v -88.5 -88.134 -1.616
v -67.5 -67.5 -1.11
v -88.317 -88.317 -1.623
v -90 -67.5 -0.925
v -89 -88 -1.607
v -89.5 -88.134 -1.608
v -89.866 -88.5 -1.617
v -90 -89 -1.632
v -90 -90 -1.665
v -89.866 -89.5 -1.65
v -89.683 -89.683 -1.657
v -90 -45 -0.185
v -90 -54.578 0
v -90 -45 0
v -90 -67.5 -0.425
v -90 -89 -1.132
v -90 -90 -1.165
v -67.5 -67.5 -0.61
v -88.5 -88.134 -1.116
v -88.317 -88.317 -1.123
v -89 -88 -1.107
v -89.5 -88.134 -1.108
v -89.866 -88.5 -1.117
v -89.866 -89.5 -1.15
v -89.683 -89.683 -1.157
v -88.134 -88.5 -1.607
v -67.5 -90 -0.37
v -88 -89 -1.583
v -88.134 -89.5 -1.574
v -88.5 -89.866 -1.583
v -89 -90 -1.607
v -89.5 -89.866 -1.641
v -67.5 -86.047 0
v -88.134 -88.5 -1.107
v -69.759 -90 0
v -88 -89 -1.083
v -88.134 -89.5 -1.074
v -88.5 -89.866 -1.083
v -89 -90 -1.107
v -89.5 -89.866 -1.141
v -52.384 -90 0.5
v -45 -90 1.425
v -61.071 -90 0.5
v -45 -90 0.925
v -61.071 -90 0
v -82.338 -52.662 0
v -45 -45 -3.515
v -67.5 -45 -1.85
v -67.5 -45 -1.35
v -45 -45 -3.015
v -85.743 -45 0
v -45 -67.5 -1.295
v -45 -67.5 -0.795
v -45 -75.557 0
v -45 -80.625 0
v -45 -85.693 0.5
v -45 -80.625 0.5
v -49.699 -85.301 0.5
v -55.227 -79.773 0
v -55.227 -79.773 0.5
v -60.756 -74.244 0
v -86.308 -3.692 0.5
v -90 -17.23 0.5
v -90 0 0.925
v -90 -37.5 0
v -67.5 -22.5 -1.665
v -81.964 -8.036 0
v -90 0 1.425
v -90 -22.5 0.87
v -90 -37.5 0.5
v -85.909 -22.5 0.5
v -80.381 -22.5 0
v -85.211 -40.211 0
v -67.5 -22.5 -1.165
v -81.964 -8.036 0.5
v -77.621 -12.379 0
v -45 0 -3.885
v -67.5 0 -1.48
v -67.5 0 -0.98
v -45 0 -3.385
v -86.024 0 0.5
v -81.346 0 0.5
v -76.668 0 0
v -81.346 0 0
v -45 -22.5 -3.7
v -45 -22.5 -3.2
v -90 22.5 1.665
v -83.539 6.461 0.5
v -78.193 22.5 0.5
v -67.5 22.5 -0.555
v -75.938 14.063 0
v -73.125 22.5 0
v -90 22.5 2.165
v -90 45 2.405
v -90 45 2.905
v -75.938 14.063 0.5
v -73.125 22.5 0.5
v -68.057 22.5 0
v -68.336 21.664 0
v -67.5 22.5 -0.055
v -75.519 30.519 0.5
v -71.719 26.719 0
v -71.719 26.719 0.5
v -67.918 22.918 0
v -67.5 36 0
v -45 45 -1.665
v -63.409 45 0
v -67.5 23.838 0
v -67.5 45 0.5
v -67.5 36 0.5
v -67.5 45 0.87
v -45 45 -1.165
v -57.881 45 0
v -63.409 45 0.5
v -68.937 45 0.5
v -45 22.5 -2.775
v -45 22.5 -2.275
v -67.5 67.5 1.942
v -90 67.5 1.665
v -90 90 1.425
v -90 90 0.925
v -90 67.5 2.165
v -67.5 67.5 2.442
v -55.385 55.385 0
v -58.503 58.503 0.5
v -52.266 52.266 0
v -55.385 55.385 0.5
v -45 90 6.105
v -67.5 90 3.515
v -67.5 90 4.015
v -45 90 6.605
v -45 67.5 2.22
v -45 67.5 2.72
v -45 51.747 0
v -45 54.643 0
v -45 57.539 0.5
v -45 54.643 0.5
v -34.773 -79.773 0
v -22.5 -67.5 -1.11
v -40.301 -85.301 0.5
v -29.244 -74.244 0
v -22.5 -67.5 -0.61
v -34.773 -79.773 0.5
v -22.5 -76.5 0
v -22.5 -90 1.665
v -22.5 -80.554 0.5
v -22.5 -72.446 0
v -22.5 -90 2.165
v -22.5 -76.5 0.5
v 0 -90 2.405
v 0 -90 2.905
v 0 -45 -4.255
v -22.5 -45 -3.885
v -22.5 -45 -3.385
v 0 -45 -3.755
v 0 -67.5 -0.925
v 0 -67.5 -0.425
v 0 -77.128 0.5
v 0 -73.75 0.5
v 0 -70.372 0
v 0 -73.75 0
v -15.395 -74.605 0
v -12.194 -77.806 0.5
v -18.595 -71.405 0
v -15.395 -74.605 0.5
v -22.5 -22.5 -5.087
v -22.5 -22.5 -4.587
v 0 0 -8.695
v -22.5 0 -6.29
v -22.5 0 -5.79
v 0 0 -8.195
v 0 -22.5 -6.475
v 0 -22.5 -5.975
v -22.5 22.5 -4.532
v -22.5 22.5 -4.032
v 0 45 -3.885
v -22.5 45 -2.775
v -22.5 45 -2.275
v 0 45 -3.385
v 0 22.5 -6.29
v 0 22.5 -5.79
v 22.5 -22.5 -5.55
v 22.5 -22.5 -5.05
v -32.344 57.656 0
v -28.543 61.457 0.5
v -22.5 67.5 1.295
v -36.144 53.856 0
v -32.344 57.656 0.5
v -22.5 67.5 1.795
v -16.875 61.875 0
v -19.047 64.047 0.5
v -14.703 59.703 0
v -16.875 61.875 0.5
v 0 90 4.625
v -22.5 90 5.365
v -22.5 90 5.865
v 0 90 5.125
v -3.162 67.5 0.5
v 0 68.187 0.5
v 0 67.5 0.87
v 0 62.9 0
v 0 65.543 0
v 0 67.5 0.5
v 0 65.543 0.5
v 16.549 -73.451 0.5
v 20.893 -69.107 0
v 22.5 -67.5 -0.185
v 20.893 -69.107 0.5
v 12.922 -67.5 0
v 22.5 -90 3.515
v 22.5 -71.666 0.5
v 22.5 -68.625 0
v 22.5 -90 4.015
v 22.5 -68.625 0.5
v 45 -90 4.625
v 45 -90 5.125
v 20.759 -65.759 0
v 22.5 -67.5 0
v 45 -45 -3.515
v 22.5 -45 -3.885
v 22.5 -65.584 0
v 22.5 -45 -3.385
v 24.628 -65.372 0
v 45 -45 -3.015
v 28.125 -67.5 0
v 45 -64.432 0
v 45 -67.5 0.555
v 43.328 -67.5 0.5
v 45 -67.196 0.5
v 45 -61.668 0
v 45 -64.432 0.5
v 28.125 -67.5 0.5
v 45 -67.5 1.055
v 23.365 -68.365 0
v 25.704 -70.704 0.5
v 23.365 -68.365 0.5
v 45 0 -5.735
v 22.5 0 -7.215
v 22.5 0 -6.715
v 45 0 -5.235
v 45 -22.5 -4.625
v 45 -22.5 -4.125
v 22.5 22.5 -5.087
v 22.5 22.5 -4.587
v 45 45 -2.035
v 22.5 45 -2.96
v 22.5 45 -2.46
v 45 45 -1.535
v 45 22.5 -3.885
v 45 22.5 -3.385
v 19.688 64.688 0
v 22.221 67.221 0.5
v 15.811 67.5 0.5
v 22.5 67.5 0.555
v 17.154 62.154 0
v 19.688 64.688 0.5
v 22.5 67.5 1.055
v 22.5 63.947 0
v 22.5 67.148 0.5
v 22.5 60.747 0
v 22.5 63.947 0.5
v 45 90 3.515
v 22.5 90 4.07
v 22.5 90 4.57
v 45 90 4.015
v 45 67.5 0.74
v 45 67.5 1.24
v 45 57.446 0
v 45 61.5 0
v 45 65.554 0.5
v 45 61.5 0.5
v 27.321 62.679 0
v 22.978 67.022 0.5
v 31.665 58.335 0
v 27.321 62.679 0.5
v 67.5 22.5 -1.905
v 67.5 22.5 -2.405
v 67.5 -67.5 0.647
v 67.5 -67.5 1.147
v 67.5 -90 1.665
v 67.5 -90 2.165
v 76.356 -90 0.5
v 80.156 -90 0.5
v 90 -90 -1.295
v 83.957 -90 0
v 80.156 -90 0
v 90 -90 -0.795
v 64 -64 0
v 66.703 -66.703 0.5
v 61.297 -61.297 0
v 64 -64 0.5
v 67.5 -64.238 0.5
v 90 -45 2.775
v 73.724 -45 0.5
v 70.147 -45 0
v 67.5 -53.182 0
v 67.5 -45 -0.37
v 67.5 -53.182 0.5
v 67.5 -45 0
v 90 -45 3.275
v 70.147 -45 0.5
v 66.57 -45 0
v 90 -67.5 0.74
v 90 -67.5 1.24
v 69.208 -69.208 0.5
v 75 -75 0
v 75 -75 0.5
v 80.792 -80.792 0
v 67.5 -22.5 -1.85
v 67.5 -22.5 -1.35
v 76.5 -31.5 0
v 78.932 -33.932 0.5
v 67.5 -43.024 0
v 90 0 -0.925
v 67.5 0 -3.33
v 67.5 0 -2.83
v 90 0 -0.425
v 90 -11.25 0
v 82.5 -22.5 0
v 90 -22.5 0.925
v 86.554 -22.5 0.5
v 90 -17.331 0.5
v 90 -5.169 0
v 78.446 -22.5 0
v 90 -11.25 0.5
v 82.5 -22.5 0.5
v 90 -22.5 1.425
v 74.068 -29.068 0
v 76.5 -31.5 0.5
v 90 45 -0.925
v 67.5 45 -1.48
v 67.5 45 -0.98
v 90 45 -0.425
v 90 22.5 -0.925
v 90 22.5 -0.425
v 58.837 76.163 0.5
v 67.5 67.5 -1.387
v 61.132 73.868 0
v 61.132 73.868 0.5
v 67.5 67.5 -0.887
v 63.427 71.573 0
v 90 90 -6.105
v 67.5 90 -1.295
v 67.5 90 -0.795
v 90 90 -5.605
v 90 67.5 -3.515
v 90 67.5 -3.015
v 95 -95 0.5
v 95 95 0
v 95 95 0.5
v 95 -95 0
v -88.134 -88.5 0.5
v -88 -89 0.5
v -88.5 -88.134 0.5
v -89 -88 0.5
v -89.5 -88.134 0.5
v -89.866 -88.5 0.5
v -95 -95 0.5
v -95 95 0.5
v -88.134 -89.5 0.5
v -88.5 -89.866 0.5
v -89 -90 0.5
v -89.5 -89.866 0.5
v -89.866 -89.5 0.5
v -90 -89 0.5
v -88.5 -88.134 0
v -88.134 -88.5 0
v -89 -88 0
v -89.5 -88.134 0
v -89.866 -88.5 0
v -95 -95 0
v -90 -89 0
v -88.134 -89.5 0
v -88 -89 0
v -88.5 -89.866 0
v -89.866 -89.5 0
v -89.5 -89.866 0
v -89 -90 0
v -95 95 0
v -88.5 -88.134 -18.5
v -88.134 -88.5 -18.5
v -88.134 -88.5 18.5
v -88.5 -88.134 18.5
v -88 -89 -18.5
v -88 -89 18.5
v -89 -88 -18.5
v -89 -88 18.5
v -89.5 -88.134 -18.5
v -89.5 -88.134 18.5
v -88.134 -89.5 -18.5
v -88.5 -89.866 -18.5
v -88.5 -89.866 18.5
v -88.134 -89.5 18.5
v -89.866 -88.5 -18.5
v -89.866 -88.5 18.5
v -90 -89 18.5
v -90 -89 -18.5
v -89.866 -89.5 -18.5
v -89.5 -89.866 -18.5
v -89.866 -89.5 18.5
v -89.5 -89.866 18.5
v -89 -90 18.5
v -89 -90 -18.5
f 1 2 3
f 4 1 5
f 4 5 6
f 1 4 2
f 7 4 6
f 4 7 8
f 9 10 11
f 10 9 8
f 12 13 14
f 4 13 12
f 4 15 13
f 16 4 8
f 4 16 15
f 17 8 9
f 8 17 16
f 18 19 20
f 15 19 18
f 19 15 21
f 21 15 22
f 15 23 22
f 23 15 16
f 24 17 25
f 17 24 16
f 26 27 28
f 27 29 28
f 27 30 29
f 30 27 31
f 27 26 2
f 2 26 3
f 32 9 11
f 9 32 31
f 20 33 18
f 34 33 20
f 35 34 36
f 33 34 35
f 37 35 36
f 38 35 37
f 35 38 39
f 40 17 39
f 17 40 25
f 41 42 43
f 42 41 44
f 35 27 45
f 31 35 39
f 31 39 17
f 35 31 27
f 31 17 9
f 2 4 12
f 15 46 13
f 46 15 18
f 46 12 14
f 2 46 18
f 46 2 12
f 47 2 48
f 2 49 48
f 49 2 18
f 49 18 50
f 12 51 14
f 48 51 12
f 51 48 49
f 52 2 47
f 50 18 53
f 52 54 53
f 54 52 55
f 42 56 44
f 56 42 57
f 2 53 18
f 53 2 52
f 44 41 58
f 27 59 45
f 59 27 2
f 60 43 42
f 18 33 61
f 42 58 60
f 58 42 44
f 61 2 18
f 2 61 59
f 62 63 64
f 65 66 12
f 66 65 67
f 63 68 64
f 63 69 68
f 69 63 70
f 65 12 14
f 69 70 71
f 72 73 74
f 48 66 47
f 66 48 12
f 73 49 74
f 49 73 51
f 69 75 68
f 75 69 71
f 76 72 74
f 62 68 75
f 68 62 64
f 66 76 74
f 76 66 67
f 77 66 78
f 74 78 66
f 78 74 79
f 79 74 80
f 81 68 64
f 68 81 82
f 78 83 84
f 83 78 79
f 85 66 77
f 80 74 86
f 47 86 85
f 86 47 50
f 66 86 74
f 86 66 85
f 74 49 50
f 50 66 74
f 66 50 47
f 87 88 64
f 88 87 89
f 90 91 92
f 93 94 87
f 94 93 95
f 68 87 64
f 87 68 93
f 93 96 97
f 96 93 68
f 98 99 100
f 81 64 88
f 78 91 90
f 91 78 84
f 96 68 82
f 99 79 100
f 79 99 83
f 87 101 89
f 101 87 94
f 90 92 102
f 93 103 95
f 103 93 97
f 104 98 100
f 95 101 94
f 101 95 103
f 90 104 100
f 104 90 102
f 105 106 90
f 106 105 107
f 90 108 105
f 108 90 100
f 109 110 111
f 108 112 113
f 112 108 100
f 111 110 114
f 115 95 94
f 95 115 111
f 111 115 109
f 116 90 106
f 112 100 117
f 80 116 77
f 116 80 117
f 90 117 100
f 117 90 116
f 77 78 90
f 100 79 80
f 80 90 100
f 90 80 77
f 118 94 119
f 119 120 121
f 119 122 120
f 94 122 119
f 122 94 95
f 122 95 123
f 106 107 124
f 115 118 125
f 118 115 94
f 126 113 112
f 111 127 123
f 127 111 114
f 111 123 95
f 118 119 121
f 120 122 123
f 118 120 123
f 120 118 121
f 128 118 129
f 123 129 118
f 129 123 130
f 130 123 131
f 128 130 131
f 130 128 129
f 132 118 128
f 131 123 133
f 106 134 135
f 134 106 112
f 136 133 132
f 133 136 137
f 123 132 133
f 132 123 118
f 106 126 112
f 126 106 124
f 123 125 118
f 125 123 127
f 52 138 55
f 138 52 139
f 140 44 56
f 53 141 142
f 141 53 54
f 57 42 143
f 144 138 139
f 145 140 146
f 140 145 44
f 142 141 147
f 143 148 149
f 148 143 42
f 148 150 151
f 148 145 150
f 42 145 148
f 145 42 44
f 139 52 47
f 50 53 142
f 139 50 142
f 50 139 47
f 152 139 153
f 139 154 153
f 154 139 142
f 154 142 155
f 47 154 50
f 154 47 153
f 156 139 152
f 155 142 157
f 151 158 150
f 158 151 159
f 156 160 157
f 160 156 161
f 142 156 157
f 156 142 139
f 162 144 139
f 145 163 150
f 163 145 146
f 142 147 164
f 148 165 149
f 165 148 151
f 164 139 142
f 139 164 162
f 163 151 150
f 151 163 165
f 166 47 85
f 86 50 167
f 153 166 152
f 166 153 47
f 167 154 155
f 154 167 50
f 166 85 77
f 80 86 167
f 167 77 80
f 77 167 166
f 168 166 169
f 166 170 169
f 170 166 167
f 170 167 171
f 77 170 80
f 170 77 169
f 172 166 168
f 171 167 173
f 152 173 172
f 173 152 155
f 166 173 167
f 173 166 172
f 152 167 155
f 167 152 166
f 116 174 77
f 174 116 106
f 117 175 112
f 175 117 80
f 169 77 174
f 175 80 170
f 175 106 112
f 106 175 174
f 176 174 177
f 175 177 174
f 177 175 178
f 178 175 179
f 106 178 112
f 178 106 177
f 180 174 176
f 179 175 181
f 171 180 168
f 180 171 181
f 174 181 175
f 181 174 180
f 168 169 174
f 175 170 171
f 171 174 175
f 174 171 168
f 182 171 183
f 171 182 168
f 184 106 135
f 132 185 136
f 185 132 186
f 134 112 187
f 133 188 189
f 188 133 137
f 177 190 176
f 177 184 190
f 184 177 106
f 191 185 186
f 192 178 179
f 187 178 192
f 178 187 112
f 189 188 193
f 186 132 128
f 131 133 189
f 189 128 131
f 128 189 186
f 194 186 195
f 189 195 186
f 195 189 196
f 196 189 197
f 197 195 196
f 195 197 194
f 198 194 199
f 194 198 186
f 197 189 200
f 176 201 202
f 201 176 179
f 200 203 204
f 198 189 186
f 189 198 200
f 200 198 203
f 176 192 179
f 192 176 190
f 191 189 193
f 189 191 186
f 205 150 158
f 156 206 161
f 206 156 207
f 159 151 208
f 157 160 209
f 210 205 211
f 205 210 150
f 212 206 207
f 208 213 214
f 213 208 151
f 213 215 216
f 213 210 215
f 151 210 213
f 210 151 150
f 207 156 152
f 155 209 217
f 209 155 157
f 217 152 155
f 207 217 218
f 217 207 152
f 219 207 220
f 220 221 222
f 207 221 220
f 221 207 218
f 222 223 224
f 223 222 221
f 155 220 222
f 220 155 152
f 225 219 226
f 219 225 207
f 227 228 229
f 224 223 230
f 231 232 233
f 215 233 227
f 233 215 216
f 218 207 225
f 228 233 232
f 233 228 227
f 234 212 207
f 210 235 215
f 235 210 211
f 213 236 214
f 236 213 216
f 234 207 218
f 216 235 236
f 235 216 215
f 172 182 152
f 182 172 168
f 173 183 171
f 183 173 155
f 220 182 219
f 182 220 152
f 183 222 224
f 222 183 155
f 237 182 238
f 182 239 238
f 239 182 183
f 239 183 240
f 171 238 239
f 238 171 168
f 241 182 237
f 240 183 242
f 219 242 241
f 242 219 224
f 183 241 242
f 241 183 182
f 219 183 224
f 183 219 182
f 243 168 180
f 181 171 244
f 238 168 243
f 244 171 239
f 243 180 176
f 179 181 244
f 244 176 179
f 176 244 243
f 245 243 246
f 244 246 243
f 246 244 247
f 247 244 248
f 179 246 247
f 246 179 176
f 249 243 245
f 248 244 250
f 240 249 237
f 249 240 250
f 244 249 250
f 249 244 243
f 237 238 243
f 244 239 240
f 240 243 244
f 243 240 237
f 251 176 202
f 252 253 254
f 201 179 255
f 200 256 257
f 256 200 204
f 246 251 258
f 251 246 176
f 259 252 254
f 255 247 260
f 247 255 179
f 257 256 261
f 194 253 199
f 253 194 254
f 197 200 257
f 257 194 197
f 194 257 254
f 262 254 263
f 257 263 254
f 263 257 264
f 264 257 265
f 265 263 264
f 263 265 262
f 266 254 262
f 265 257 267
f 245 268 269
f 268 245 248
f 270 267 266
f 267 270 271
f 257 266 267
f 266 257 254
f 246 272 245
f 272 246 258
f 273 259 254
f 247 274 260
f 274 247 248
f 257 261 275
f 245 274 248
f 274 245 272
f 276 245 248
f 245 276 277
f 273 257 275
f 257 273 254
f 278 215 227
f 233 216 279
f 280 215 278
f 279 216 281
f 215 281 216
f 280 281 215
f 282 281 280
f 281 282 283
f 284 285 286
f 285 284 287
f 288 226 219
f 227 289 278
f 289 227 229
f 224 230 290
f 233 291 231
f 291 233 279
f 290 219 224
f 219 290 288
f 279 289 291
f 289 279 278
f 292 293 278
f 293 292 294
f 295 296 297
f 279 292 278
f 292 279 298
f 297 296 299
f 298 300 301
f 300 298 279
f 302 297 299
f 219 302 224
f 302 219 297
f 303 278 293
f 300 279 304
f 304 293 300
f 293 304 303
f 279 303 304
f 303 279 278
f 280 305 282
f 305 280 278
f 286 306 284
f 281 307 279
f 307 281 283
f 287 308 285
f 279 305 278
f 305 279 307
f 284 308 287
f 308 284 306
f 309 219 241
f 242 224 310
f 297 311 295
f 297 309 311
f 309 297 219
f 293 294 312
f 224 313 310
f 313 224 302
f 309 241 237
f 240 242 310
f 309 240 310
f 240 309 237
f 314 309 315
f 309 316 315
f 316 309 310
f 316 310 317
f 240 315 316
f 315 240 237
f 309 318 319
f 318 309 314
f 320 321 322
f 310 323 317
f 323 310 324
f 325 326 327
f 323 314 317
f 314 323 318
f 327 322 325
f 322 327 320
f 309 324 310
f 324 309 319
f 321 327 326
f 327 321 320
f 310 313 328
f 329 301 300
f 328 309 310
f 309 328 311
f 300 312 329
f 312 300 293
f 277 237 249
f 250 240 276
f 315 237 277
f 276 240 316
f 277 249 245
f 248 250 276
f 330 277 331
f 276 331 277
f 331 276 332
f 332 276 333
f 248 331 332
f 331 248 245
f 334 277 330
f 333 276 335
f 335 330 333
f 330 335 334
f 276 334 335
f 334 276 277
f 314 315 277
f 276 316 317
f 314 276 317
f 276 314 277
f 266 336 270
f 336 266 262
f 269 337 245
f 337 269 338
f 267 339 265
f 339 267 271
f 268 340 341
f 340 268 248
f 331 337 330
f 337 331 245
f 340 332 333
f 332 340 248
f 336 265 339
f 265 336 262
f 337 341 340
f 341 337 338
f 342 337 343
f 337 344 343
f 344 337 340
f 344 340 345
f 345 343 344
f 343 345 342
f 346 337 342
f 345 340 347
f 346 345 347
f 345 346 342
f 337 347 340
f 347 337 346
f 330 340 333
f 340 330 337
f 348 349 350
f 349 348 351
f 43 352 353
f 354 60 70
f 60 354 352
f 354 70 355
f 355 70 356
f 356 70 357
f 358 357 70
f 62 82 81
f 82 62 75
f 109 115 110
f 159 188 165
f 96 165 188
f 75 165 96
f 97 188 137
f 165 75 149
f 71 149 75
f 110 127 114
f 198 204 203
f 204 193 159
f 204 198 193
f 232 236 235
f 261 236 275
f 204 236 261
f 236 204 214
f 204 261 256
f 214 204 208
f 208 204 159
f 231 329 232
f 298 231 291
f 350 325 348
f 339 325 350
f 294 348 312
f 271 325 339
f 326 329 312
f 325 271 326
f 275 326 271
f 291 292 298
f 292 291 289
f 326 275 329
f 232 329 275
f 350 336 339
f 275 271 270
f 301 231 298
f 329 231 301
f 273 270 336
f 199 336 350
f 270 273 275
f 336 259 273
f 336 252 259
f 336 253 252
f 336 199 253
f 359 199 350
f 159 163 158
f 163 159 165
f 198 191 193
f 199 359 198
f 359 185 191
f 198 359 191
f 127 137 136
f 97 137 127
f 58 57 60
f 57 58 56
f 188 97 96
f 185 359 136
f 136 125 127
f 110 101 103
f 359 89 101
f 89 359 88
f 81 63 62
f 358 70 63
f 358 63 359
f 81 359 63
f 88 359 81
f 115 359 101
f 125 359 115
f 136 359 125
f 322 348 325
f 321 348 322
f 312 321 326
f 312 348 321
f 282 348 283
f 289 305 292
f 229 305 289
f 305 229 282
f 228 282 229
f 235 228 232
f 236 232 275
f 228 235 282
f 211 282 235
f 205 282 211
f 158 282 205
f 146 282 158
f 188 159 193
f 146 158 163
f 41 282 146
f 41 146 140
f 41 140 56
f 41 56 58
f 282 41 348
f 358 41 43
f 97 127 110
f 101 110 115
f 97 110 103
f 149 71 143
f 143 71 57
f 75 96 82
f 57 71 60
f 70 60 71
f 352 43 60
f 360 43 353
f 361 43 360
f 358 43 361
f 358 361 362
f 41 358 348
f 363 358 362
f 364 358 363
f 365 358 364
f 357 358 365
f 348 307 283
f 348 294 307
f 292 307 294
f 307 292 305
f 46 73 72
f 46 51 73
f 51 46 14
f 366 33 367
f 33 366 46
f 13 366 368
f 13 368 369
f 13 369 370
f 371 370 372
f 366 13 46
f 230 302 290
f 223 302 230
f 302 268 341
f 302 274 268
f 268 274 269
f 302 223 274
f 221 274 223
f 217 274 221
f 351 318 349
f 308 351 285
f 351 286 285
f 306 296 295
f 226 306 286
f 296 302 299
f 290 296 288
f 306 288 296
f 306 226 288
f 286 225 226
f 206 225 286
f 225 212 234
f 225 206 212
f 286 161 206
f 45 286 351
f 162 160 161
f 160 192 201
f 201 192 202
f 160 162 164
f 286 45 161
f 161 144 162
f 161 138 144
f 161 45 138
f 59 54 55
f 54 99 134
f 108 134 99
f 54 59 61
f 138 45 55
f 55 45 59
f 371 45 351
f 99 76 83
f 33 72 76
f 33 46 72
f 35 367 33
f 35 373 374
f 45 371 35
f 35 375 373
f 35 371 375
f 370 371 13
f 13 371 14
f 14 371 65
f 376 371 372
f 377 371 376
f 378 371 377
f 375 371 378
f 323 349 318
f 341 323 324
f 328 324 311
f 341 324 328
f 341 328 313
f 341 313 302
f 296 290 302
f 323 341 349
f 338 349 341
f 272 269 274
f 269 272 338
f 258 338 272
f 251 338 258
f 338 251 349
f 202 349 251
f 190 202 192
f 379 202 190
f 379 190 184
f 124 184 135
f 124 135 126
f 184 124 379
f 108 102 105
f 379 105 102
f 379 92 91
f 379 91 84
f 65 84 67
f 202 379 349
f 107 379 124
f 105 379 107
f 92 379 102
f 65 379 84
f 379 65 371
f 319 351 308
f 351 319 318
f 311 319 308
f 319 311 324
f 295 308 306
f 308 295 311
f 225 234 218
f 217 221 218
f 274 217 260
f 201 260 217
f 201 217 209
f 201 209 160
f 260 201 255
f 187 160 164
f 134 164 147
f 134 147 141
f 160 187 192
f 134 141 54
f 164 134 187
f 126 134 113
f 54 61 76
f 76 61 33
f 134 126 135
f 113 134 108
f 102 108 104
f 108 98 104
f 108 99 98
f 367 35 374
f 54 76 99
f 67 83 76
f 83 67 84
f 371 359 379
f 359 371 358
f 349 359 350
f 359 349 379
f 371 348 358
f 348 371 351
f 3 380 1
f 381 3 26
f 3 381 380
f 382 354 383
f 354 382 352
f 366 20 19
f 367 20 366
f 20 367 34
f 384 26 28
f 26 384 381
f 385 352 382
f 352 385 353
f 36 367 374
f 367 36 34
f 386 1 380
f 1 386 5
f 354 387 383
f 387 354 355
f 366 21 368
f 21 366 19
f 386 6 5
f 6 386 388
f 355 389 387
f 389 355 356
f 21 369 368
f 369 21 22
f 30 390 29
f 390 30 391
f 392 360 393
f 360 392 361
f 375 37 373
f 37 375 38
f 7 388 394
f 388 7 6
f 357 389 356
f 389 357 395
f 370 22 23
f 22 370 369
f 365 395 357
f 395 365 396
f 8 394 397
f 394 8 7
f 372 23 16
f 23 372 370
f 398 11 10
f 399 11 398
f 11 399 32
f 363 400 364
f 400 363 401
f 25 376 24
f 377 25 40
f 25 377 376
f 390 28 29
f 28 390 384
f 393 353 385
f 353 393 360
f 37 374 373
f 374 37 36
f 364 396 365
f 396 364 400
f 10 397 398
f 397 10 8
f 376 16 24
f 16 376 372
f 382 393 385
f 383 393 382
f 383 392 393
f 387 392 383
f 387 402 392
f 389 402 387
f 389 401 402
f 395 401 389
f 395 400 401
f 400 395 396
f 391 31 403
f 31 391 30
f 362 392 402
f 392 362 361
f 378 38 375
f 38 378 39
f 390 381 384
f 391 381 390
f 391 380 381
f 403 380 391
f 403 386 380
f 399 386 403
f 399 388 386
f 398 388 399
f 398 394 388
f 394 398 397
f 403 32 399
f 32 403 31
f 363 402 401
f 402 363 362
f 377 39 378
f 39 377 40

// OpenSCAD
 /**************************************\
 *                                      *
 *   OpenSCAD Mesh Display              *
 *   by Thinkyhead - April 2017         *
 *                                      *
 *   Copy the grid output from mvCNC,  *
 *   paste below as shown, and use      *
 *   OpenSCAD to see a visualization    *
 *   of your mesh.                      *
 *                                      *
 \**************************************/

$t = 0.15; // comment out during animation!
X = 0; Y = 1;
L = 0; R = 1; F = 2; B = 3;

//
// Sample Mesh - Replace with your own
//
measured_z = [
  [ -1.20, -1.13, -1.09, -1.03, -1.19 ],
  [ -1.16, -1.25, -1.27, -1.25, -1.08 ],
  [ -1.13, -1.26, -1.39, -1.31, -1.18 ],
  [ -1.09, -1.20, -1.26, -1.21, -1.18 ],
  [ -1.13, -0.99, -1.03, -1.06, -1.32 ]
];

//
// An offset to add to all points in the mesh
//
zadjust     = 0;

//
// Mesh characteristics
//
bed_size = [ 200, 200 ];

mesh_inset  = [ 10, 10, 10, 10 ]; // L, F, R, B

mesh_bounds = [
  [ mesh_inset[L], mesh_inset[F] ],
  [ bed_size[X] - mesh_inset[R], bed_size[Y] - mesh_inset[B] ]
];

mesh_size = mesh_bounds[1] - mesh_bounds[0];

                      // NOTE: mvCNC meshes already subtract the probe offset
NAN         = 0;      // Z to use for un-measured points

//
// Geometry
//

max_z_scale   = 100;   // Scale at Time 0.5
min_z_scale   = 10;    // Scale at Time 0.0 and 1.0
thickness     = 0.5;   // thickness of the mesh triangles
tesselation   = 1;     // levels of tesselation from 0-2
alternation   = 2;     // direction change modulus (try it)

//
// Appearance
//

show_plane    = true;
show_labels   = true;
show_coords   = true;
arrow_length  = 5;

label_font_lg = "Arial";
label_font_sm = "Arial";
mesh_color    = [1,1,1,0.5];
plane_color   = [0.4,0.6,0.9,0.6];

//================================================ Derive useful values

big_z = max_2D(measured_z,0);
lil_z = min_2D(measured_z,0);

mean_value = (big_z + lil_z) / 2.0;

mesh_points_y = len(measured_z);
mesh_points_x = len(measured_z[0]);

xspace = mesh_size[X] / (mesh_points_x - 1);
yspace = mesh_size[Y] / (mesh_points_y - 1);

// At $t=0 and $t=1 scale will be 100%
z_scale_factor = min_z_scale + (($t > 0.5) ? 1.0 - $t : $t) * (max_z_scale - min_z_scale) * 2;

//
// Min and max recursive functions for 1D and 2D arrays
// Return the smallest or largest value in the array
//
function some_1D(b,i) = (i<len(b)-1) ? (b[i] && some_1D(b,i+1)) : b[i] != 0;
function some_2D(a,j) = (j<len(a)-1) ? some_2D(a,j+1) : some_1D(a[j], 0);
function min_1D(b,i) = (i<len(b)-1) ? min(b[i], min_1D(b,i+1)) : b[i];
function min_2D(a,j) = (j<len(a)-1) ? min_2D(a,j+1) : min_1D(a[j], 0);
function max_1D(b,i) = (i<len(b)-1) ? max(b[i], max_1D(b,i+1)) : b[i];
function max_2D(a,j) = (j<len(a)-1) ? max_2D(a,j+1) : max_1D(a[j], 0);

//
// Get the corner probe points of a grid square.
//
// Input  : x,y grid indexes
// Output : An array of the 4 corner points
//
function grid_square(x,y) = [
  [x * xspace, y * yspace, z_scale_factor * (measured_z[y][x] - mean_value)],
  [x * xspace, (y+1) * yspace, z_scale_factor * (measured_z[y+1][x] - mean_value)],
  [(x+1) * xspace, (y+1) * yspace, z_scale_factor * (measured_z[y+1][x+1] - mean_value)],
  [(x+1) * xspace, y * yspace, z_scale_factor * (measured_z[y][x+1] - mean_value)]
];

// The corner point of a grid square with Z centered on the mean
function pos(x,y,z) = [x * xspace, y * yspace, z_scale_factor * (z - mean_value)];

//
// Draw the point markers and labels
//
module point_markers(show_home=true) {
  // Mark the home position 0,0
  if (show_home)
    translate([1,1]) color([0,0,0,0.25])
      cylinder(r=1, h=z_scale_factor, center=true);

  for (x=[0:mesh_points_x-1], y=[0:mesh_points_y-1]) {
    z = measured_z[y][x] - zadjust;
    down = z < mean_value;
    xyz = pos(x, y, z);
    translate([ xyz[0], xyz[1] ]) {

      // Show the XY as well as the Z!
      if (show_coords) {
        color("black")
        translate([0,0,0.5]) {
          $fn=8;
          rotate([0,0]) {
            posx = floor(mesh_bounds[0][X] + x * xspace);
            posy = floor(mesh_bounds[0][Y] + y * yspace);
            text(str(posx, ",", posy), 2, label_font_sm, halign="center", valign="center");
          }
        }
      }

      translate([ 0, 0, xyz[2] ]) {
        // Label each point with the Z
        v = z - mean_value;
        if (show_labels) {

          color(abs(v) < 0.1 ? [0,0.5,0] : [0.25,0,0])
          translate([0,0,down?-10:10]) {

            $fn=8;
            rotate([90,0])
              text(str(z), 6, label_font_lg, halign="center", valign="center");

            if (v)
              translate([0,0,down?-6:6]) rotate([90,0])
                text(str(down || !v ? "" : "+", v), 3, label_font_sm, halign="center", valign="center");
          }
        }

        // Show an arrow pointing up or down
        if (v) {
          rotate([0, down ? 180 : 0]) translate([0,0,-1])
            cylinder(
              r1=0.5,
              r2=0.1,
              h=arrow_length, $fn=12, center=1
            );
        }
        else
          color([1,0,1,0.4]) sphere(r=1.0, $fn=20, center=1);
      }
    }
  }
}

//
// Split a square on the diagonal into
// two triangles and render them.
//
//     s : a square
//   alt : a flag to split on the other diagonal
//
module tesselated_square(s, alt=false) {
  add = [0,0,thickness];
  p1 = [
    s[0], s[1], s[2], s[3],
    s[0]+add, s[1]+add, s[2]+add, s[3]+add
  ];
  f1 = alt
      ? [ [0,1,3], [4,5,1,0], [4,7,5], [5,7,3,1], [7,4,0,3] ]
      : [ [0,1,2], [4,5,1,0], [4,6,5], [5,6,2,1], [6,4,0,2] ];
  f2 = alt
      ? [ [1,2,3], [5,6,2,1], [5,6,7], [6,7,3,2], [7,5,1,3] ]
      : [ [0,2,3], [4,6,2,0], [4,7,6], [6,7,3,2], [7,4,0,3] ];

  // Use the other diagonal
  polyhedron(points=p1, faces=f1);
  polyhedron(points=p1, faces=f2);
}

/**
 * The simplest mesh display
 */
module simple_mesh(show_plane=show_plane) {
  if (show_plane) color(plane_color) cube([mesh_size[X], mesh_size[Y], thickness]);
  color(mesh_color)
    for (x=[0:mesh_points_x-2], y=[0:mesh_points_y-2])
      tesselated_square(grid_square(x, y));
}

/**
 * Subdivide the mesh into smaller squares.
 */
module bilinear_mesh(show_plane=show_plane,tesselation=tesselation) {
  if (show_plane) color(plane_color) translate([-5,-5]) cube([mesh_size[X]+10, mesh_size[Y]+10, thickness]);

  if (some_2D(measured_z, 0)) {

    tesselation = tesselation % 4;
    color(mesh_color)
    for (x=[0:mesh_points_x-2], y=[0:mesh_points_y-2]) {
      square = grid_square(x, y);
      if (tesselation < 1) {
        tesselated_square(square,(x%alternation)-(y%alternation));
      }
      else {
        subdiv_4 = subdivided_square(square);
        if (tesselation < 2) {
          for (i=[0:3]) tesselated_square(subdiv_4[i],i%alternation);
        }
        else {
          for (i=[0:3]) {
            subdiv_16 = subdivided_square(subdiv_4[i]);
            if (tesselation < 3) {
              for (j=[0:3]) tesselated_square(subdiv_16[j],j%alternation);
            }
            else {
              for (j=[0:3]) {
                subdiv_64 = subdivided_square(subdiv_16[j]);
                if (tesselation < 4) {
                  for (k=[0:3]) tesselated_square(subdiv_64[k]);
                }
              }
            }
          }
        }
      }
    }

  }
}

//
// Subdivision helpers
//
function ctrz(a) = (a[0][2]+a[1][2]+a[3][2]+a[2][2])/4;
function avgx(a,i) = (a[i][0]+a[(i+1)%4][0])/2;
function avgy(a,i) = (a[i][1]+a[(i+1)%4][1])/2;
function avgz(a,i) = (a[i][2]+a[(i+1)%4][2])/2;

//
// Convert one square into 4, applying bilinear averaging
//
// Input  : 1 square (4 points)
// Output : An array of 4 squares
//
function subdivided_square(a) = [
  [ // SW square
    a[0],                          // SW
    [a[0][0],avgy(a,0),avgz(a,0)], // CW
    [avgx(a,1),avgy(a,0),ctrz(a)], // CC
    [avgx(a,1),a[0][1],avgz(a,3)]  // SC
  ],
  [ // NW square
    [a[0][0],avgy(a,0),avgz(a,0)], // CW
    a[1],                          // NW
    [avgx(a,1),a[1][1],avgz(a,1)], // NC
    [avgx(a,1),avgy(a,0),ctrz(a)]  // CC
  ],
  [ // NE square
    [avgx(a,1),avgy(a,0),ctrz(a)], // CC
    [avgx(a,1),a[1][1],avgz(a,1)], // NC
    a[2],                          // NE
    [a[2][0],avgy(a,0),avgz(a,2)]  // CE
  ],
  [ // SE square
    [avgx(a,1),a[0][1],avgz(a,3)], // SC
    [avgx(a,1),avgy(a,0),ctrz(a)], // CC
    [a[2][0],avgy(a,0),avgz(a,2)], // CE
    a[3]                           // SE
  ]
];


//================================================ Run the plan

translate([-mesh_size[X] / 2, -mesh_size[Y] / 2]) {
  $fn = 12;
  point_markers();
  bilinear_mesh();
}
